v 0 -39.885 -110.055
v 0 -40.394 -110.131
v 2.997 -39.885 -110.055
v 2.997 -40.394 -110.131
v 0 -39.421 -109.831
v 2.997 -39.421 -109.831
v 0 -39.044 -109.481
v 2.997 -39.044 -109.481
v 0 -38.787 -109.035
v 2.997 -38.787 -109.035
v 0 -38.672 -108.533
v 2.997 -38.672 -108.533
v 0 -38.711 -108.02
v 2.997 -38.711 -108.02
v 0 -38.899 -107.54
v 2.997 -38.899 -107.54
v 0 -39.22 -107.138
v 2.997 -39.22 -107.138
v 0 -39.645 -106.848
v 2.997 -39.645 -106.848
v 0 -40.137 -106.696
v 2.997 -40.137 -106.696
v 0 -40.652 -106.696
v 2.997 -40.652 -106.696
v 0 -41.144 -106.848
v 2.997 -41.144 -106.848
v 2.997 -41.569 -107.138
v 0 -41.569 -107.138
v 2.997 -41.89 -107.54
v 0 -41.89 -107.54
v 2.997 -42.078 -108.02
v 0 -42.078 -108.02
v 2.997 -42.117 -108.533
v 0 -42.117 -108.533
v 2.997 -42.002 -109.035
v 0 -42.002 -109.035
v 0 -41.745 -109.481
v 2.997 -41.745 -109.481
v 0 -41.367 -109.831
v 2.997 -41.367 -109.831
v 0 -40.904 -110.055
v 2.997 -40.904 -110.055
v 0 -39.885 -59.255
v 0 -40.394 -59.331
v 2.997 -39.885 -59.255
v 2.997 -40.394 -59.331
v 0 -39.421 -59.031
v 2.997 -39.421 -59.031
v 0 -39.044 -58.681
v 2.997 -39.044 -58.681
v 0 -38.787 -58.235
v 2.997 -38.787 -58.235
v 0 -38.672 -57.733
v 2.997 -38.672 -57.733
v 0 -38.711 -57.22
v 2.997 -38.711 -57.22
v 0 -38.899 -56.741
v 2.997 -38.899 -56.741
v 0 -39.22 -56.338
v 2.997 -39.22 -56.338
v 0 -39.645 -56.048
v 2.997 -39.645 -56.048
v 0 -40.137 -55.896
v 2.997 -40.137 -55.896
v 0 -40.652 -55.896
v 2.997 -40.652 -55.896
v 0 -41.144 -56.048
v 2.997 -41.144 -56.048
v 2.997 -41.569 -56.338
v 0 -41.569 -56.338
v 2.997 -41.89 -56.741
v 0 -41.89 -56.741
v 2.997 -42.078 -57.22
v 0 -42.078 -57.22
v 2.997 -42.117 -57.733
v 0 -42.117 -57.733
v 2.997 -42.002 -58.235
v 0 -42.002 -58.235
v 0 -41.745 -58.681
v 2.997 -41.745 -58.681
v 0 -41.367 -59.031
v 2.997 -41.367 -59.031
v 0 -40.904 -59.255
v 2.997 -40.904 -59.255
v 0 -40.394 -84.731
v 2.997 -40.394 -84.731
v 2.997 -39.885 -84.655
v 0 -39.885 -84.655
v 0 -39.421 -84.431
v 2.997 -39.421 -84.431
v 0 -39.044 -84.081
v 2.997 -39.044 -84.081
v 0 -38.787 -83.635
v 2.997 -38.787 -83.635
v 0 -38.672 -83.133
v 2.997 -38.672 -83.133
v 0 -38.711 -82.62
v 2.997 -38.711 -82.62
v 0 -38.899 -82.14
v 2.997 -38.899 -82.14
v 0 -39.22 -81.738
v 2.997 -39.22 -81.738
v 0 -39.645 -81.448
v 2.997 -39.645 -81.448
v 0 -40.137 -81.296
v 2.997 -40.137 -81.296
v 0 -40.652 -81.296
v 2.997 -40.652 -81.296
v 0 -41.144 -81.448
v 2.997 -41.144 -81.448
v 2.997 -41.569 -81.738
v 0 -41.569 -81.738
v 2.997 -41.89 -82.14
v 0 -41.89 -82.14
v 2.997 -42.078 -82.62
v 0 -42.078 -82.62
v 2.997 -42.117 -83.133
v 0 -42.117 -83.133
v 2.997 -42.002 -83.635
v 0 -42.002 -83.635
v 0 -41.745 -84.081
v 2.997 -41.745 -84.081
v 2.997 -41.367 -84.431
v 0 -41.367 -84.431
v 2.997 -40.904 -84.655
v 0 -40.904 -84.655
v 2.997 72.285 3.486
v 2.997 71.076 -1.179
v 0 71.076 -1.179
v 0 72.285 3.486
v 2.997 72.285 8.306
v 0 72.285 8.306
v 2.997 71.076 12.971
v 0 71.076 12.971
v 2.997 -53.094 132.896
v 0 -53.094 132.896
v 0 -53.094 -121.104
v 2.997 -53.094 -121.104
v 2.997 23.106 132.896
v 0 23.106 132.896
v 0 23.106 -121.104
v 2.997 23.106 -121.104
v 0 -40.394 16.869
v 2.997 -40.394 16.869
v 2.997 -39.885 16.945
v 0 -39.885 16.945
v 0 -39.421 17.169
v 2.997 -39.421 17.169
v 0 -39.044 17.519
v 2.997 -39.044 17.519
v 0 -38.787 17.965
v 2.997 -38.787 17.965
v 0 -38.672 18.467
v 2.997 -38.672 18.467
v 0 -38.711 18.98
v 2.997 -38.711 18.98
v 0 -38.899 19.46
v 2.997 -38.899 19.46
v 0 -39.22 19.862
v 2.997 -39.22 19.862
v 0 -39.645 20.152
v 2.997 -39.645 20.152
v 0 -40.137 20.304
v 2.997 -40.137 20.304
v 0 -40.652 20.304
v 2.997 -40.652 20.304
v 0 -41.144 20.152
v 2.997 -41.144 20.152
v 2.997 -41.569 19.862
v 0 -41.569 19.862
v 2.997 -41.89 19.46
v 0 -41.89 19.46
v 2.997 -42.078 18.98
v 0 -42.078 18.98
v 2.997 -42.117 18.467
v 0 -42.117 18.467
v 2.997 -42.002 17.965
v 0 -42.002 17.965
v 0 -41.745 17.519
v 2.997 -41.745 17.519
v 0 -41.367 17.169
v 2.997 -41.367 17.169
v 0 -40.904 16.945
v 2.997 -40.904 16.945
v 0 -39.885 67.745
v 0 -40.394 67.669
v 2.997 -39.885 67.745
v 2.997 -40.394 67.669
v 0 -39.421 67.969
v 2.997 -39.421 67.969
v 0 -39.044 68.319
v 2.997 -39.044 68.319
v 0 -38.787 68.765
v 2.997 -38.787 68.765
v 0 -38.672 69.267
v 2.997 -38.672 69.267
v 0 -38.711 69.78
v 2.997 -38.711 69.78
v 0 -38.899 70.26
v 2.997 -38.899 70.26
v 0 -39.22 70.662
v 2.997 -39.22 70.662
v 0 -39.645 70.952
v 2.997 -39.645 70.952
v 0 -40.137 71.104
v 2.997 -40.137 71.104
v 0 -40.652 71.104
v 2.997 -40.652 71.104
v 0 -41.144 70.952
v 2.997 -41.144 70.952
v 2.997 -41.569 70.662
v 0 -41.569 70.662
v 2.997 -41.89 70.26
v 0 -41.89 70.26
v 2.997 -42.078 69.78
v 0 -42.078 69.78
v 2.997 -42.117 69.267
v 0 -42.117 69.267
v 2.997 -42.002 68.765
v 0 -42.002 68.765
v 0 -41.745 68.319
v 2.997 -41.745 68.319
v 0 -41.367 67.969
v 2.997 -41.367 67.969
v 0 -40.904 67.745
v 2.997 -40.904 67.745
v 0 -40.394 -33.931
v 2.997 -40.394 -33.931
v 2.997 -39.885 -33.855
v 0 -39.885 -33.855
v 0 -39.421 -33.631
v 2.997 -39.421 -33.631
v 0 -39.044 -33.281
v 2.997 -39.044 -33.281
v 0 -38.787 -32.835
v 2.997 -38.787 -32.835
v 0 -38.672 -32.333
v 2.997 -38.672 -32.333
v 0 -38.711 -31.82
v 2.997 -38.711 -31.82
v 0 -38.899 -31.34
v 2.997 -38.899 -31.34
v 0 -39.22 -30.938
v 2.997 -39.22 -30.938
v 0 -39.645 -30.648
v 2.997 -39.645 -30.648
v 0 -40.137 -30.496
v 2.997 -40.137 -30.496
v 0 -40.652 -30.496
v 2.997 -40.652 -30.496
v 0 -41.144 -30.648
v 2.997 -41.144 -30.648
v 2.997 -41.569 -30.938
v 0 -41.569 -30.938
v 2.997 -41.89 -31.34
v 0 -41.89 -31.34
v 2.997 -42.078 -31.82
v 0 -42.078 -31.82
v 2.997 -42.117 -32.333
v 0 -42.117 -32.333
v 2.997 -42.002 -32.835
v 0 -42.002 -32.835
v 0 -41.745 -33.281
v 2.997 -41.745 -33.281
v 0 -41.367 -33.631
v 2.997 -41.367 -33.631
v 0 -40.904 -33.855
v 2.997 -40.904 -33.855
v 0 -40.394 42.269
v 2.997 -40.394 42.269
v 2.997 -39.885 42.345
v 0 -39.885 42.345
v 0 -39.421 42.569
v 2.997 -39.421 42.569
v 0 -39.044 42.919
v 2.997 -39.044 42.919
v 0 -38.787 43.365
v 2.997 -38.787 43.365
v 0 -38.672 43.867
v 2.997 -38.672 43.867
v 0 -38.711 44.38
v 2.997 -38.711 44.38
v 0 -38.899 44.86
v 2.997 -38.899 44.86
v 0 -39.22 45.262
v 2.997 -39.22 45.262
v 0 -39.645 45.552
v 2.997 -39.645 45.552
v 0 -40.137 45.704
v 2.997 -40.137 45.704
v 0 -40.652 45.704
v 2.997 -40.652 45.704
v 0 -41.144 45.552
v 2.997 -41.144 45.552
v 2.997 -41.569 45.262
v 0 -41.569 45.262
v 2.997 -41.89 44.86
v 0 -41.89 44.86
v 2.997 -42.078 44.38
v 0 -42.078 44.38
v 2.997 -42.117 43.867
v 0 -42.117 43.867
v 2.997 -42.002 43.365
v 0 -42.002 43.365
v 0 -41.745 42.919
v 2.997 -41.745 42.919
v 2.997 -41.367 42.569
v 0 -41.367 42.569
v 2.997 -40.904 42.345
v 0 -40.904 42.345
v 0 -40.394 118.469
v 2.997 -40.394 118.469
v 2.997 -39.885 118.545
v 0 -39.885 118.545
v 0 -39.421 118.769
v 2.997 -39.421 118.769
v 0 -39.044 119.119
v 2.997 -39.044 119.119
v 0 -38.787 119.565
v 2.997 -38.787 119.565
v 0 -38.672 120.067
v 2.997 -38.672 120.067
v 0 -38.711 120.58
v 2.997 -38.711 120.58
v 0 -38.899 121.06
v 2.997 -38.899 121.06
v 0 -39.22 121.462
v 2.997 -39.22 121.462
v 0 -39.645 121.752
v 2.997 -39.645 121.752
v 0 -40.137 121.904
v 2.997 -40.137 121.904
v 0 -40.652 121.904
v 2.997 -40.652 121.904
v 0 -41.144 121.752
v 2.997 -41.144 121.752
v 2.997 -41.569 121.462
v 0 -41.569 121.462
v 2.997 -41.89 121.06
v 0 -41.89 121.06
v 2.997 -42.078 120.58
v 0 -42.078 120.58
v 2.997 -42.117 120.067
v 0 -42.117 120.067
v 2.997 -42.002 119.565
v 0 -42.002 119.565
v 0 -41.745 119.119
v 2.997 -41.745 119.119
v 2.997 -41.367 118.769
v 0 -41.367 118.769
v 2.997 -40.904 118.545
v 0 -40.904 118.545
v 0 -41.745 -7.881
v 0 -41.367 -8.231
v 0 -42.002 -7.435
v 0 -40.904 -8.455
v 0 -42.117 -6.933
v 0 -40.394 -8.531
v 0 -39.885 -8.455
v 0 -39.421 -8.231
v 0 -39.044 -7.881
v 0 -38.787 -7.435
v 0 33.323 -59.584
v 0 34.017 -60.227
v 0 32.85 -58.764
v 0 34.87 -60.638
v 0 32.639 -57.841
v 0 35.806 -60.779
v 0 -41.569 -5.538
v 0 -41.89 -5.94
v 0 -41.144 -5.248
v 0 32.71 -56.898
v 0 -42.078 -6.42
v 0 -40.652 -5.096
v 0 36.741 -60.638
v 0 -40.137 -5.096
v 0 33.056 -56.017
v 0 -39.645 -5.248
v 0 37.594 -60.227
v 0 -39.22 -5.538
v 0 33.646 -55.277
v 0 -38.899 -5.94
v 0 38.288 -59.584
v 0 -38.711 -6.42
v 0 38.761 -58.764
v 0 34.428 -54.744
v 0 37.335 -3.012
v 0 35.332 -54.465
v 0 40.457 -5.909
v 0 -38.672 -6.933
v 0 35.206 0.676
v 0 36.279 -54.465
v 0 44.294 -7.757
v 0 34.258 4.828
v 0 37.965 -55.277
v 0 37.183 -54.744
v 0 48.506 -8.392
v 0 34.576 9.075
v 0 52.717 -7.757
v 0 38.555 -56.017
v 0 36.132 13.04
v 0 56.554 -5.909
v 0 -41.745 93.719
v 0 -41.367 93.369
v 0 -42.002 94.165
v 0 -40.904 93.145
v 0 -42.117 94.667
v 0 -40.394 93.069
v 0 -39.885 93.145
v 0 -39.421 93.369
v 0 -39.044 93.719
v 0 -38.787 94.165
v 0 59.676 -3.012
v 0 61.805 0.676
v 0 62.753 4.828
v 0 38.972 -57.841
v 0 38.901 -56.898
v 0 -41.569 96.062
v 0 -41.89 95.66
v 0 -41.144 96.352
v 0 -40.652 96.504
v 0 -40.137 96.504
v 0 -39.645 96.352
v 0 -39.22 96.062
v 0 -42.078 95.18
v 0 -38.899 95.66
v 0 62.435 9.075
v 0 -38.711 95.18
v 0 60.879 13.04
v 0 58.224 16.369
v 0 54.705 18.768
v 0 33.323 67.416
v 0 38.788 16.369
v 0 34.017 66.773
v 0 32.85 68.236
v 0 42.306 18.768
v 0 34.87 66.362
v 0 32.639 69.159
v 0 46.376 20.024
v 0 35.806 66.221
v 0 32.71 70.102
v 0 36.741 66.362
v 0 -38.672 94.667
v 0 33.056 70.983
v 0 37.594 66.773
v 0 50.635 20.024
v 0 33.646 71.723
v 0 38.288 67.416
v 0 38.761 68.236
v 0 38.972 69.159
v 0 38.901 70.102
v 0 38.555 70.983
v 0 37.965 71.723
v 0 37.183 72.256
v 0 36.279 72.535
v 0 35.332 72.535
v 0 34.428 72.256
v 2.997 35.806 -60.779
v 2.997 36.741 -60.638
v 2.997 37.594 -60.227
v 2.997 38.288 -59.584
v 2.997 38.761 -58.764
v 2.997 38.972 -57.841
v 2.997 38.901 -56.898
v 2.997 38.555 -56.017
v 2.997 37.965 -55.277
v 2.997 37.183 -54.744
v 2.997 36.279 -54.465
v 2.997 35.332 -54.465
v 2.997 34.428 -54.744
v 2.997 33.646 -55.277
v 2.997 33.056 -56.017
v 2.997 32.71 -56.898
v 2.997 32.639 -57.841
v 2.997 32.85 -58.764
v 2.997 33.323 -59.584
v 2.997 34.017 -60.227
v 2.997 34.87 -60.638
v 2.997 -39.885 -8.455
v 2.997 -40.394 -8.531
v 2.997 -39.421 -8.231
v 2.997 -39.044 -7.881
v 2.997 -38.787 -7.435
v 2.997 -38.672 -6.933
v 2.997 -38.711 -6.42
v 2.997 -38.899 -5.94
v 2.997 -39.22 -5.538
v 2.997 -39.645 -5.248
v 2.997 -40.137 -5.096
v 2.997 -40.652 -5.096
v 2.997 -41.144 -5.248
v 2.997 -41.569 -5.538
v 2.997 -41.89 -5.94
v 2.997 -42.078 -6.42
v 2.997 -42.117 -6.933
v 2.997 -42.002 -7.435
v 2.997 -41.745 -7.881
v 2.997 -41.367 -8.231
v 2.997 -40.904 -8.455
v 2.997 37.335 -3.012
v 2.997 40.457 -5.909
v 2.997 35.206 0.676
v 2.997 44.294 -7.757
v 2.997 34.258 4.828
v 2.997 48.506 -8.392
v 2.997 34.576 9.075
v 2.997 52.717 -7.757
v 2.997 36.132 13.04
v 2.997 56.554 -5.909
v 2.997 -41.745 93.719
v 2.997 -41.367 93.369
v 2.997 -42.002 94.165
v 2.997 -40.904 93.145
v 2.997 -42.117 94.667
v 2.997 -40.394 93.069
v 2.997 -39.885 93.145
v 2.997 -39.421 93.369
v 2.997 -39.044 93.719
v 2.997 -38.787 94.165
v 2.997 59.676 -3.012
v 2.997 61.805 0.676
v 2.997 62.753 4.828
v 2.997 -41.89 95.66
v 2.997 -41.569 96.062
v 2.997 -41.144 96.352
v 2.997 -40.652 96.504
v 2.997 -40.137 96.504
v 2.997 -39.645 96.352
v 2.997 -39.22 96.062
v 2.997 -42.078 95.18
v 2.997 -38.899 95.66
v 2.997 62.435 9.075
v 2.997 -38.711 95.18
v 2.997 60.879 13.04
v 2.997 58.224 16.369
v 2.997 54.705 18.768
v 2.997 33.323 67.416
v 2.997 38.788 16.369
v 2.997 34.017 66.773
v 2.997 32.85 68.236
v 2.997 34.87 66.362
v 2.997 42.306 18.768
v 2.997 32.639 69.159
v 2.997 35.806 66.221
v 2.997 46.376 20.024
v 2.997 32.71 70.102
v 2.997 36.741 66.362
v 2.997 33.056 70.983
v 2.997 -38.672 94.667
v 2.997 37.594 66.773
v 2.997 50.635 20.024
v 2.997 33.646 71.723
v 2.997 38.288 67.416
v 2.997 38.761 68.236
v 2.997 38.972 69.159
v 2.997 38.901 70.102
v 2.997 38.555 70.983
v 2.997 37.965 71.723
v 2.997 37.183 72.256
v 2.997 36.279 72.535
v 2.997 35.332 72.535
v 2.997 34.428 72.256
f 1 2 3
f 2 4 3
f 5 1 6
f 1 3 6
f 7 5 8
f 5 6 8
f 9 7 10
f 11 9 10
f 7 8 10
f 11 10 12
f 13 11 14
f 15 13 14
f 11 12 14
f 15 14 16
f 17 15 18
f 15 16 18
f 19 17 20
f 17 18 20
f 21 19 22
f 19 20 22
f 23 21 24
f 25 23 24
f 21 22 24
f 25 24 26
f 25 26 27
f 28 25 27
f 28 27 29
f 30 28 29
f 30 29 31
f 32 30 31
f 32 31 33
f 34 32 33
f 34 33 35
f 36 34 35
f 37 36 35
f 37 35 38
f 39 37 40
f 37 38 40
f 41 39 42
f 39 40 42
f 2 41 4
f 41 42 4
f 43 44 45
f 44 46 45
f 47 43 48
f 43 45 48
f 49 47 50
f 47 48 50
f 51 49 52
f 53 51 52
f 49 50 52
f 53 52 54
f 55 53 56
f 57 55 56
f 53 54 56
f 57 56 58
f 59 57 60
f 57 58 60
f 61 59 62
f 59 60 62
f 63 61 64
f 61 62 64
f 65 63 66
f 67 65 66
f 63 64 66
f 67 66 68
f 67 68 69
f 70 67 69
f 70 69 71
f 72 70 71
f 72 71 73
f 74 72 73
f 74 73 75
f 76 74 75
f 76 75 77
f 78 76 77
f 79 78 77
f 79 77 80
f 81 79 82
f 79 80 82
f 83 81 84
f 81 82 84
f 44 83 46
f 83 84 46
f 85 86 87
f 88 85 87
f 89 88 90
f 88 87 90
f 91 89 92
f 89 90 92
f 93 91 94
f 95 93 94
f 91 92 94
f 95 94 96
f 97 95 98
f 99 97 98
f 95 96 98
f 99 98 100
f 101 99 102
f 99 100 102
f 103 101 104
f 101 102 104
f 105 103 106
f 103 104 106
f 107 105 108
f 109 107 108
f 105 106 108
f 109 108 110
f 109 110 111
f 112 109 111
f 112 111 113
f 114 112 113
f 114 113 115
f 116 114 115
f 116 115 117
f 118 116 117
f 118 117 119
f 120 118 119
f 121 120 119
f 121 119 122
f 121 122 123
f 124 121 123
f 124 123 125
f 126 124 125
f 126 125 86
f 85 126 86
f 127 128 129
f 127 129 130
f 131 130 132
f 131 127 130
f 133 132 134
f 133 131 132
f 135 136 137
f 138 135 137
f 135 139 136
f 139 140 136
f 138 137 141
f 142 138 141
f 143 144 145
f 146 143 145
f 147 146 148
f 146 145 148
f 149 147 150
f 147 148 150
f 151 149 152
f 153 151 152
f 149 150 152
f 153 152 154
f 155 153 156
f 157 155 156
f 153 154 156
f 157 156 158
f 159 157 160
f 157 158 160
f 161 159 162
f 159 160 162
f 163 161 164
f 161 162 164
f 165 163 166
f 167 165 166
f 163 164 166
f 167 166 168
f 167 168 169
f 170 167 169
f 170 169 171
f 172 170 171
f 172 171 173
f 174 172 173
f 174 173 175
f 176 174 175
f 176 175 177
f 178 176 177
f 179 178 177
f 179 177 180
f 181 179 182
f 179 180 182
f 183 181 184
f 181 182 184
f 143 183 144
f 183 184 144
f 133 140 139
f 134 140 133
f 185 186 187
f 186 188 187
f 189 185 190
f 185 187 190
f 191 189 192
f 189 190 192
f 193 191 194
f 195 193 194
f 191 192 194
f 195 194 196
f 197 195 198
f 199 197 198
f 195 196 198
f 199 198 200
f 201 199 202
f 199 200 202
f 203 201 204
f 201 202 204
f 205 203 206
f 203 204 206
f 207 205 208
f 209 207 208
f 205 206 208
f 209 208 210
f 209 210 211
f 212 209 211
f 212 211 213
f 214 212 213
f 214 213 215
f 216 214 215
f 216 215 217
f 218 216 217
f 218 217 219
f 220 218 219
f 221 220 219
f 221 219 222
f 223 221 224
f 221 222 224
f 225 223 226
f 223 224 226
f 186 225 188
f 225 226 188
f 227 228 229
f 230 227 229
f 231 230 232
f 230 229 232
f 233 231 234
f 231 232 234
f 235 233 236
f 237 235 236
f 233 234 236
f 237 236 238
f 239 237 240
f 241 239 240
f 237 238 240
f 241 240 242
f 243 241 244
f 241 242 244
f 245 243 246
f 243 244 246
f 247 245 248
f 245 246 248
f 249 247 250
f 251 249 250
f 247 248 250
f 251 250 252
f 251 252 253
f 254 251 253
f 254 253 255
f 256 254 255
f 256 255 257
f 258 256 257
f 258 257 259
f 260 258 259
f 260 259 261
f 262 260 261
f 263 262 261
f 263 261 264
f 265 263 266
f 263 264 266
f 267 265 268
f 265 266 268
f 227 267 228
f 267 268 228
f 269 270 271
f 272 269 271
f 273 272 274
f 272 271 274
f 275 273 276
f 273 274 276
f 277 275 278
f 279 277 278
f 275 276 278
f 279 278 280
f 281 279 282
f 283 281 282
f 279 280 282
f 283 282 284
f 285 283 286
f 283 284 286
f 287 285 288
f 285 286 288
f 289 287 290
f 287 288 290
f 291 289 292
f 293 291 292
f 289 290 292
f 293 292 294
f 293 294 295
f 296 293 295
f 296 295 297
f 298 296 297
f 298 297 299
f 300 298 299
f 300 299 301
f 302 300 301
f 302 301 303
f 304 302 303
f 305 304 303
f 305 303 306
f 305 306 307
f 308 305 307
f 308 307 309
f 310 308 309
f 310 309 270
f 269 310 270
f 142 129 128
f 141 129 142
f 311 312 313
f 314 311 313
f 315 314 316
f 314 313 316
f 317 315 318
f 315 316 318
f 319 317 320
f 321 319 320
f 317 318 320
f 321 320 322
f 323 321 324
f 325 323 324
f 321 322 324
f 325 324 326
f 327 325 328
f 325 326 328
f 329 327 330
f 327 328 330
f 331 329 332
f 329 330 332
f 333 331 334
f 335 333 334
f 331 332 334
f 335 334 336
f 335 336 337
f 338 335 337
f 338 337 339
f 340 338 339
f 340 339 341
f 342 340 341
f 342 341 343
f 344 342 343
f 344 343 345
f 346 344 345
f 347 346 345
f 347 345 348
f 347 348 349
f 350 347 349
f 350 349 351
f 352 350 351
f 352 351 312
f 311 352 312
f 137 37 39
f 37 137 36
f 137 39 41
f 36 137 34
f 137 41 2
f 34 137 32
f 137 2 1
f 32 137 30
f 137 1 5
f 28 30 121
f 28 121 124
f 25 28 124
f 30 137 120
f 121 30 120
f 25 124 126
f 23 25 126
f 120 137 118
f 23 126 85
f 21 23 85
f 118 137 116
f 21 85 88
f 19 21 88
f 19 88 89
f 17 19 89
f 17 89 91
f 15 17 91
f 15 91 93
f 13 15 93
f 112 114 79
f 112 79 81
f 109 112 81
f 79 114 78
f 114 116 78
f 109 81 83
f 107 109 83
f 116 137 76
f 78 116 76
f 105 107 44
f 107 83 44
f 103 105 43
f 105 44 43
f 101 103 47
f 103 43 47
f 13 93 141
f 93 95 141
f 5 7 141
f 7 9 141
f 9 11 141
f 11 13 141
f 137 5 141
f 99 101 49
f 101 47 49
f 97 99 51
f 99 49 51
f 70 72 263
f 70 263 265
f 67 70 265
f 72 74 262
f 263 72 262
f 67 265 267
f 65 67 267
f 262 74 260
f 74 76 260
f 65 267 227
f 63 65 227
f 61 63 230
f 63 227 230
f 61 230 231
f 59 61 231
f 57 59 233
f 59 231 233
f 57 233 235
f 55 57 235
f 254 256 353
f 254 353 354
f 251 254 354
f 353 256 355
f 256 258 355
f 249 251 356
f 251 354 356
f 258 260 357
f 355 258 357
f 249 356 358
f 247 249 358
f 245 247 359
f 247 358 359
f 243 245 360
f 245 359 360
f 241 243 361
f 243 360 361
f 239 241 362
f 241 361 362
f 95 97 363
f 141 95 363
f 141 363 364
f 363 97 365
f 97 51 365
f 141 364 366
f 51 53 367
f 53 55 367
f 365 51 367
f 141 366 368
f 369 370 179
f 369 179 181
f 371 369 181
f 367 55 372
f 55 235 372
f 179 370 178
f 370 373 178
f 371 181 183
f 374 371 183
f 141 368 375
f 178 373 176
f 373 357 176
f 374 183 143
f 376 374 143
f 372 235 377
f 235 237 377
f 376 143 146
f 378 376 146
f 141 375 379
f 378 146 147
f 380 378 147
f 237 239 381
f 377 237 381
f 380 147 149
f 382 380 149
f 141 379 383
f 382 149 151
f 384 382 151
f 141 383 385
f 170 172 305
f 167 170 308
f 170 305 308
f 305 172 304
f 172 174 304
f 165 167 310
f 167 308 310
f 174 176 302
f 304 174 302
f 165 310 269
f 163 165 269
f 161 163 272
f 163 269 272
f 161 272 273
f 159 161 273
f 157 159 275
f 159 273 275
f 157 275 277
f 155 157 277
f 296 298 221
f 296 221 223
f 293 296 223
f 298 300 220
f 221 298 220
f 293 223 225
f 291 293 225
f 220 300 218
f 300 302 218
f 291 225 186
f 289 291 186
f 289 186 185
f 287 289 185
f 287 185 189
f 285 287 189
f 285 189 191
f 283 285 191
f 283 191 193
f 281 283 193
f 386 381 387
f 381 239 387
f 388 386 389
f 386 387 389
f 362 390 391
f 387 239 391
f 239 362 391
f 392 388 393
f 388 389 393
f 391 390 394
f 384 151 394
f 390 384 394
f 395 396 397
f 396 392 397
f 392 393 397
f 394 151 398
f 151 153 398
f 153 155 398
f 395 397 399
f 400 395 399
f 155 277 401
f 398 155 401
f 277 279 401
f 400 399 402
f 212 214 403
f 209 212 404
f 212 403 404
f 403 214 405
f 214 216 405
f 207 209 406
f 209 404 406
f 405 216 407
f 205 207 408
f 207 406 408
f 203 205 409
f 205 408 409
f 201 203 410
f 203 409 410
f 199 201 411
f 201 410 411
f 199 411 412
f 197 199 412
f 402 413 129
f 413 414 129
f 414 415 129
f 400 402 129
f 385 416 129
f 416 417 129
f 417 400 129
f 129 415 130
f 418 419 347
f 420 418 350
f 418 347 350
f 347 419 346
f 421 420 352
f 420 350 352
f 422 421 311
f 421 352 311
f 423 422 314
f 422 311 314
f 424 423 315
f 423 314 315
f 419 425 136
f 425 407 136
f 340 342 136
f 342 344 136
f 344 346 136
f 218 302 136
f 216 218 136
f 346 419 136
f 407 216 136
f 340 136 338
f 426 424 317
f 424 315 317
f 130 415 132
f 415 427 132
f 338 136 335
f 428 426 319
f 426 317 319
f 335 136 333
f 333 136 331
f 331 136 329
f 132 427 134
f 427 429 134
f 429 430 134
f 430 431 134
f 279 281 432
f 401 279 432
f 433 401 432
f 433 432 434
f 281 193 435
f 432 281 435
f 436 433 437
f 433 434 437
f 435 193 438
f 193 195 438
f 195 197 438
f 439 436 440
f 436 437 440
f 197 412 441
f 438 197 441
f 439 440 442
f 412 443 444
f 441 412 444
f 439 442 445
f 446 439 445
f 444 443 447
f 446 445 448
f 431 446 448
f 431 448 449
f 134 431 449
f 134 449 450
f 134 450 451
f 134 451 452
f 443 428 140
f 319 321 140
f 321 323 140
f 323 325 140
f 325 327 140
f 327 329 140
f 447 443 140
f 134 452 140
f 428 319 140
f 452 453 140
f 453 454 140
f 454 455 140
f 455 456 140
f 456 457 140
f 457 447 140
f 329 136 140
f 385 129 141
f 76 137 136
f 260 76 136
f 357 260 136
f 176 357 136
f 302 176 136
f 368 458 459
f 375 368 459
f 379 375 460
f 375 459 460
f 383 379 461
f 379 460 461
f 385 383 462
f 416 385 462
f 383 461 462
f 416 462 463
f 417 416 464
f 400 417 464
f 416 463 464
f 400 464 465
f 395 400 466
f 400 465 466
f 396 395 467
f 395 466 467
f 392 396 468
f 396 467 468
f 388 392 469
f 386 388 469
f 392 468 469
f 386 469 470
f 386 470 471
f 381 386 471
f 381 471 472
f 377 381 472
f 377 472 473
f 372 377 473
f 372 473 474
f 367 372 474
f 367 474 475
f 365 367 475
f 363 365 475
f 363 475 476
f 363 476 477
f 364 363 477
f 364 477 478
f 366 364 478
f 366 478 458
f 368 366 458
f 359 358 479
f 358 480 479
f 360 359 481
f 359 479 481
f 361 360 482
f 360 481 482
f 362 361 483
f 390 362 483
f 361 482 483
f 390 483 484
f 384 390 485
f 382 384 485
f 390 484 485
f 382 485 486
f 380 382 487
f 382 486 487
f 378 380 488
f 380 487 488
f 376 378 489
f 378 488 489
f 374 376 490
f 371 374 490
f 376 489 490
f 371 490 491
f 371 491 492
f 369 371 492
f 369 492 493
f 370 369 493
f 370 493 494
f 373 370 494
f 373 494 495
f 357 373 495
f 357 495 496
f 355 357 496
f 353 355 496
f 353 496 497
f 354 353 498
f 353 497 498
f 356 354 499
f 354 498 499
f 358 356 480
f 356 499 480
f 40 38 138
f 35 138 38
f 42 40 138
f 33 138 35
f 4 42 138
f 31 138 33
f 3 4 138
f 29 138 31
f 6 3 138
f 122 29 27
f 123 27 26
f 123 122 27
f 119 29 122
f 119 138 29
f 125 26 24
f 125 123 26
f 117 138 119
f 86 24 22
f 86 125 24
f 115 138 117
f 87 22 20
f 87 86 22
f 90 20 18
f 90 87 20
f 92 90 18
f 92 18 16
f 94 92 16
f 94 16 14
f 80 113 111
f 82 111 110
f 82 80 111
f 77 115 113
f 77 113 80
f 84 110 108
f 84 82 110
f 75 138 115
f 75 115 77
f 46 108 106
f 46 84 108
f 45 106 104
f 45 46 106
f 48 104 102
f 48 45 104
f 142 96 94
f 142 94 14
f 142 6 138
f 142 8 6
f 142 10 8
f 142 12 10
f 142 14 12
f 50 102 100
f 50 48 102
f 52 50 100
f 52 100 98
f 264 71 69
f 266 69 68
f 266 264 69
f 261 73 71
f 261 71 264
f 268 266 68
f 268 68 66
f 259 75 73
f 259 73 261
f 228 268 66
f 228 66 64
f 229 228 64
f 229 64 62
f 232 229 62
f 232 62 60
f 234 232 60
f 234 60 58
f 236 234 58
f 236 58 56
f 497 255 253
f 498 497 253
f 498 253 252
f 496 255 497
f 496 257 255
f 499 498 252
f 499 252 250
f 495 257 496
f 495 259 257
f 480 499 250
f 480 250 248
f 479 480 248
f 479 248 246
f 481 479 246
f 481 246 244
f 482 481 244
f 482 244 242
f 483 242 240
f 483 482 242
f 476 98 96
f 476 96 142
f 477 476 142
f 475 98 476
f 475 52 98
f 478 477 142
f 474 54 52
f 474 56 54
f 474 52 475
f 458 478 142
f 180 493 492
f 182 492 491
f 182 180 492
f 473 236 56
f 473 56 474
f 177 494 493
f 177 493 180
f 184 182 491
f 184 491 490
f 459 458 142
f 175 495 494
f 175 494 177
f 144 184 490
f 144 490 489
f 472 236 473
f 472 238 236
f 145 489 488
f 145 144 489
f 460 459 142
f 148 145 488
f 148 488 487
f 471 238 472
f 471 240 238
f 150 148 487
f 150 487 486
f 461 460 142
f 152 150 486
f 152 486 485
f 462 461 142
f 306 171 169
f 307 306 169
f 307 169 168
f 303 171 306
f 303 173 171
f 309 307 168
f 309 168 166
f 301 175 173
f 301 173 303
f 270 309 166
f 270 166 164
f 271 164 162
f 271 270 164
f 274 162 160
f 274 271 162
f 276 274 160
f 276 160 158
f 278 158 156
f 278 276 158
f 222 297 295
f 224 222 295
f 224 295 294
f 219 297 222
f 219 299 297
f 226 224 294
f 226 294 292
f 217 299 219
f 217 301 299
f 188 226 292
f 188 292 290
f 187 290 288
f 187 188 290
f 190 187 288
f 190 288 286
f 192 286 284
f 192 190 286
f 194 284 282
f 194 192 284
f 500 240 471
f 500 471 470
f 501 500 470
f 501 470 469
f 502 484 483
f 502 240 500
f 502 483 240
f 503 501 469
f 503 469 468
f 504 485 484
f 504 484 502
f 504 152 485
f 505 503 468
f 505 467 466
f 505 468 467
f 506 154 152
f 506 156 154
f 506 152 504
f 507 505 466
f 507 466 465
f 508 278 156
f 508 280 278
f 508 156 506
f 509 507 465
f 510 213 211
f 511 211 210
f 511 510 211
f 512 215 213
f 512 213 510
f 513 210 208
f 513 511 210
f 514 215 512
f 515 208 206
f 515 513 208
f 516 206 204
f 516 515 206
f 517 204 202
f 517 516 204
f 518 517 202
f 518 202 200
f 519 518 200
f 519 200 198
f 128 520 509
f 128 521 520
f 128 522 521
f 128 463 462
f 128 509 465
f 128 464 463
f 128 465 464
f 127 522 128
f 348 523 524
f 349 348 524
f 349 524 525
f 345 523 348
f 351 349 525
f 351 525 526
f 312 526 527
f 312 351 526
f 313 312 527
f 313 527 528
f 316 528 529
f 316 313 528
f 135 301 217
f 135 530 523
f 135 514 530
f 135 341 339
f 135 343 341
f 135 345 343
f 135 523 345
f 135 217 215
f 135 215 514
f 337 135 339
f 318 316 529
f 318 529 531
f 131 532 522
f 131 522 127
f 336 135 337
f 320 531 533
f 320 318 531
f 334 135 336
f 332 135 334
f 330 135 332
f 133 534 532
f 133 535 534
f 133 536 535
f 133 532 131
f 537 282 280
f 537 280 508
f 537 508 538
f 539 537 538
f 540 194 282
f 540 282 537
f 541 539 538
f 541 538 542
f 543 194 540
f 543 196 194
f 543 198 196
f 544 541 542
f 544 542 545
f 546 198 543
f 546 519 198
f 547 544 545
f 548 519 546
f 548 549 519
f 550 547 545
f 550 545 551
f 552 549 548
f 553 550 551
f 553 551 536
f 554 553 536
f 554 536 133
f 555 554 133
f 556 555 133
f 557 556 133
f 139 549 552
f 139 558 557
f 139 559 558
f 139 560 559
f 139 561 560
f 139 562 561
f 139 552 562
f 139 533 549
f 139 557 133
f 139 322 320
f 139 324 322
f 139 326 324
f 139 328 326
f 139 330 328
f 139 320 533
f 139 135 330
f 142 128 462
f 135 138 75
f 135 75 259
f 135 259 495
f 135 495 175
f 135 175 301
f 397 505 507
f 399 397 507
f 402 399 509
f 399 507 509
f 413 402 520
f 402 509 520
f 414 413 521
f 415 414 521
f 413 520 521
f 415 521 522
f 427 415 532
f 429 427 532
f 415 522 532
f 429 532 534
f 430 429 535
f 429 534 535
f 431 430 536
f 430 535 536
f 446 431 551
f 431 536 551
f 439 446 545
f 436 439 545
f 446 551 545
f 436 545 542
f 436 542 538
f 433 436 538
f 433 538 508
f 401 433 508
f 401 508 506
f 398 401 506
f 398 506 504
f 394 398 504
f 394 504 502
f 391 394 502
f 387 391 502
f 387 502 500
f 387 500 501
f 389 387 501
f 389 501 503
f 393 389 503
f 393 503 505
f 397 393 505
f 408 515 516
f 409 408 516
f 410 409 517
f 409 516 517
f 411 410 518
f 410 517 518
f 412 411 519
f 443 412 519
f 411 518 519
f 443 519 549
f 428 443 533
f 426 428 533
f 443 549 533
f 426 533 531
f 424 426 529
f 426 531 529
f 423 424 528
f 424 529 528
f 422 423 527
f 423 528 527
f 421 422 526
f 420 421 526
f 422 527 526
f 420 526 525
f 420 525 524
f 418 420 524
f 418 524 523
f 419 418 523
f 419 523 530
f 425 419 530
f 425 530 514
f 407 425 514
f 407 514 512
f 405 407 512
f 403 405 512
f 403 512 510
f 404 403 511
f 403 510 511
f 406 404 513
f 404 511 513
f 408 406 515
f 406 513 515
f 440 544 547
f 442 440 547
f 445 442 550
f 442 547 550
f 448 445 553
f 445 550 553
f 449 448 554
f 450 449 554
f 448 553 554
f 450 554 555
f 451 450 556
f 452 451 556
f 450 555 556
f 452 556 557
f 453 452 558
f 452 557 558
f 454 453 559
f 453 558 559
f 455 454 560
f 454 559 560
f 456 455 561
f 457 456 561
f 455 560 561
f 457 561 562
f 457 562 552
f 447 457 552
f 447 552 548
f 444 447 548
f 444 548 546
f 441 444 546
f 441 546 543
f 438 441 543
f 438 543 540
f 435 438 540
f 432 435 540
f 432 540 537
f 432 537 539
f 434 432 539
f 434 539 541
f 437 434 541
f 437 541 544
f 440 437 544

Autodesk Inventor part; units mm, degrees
ref_plane "YZ Plane" through (0, 0, 0) normal (1, 0, 0) x (0, 1, 0)
ref_plane "XZ Plane" through (0, 0, 0) normal (0, 1, 0) x (-1, 0, 0)
ref_plane "XY Plane" through (0, 0, 0) normal (0, 0, 1) x (1, 0, 0)
sketch "Sketch1" plane through (0, 0, 0) normal (1, 0, 0) x (0, 1, 0)
  line L0 (23.1056, 132.8959) -> (-53.0944, 132.8959)
  line L1 (-53.0944, 132.8959) -> (-53.0944, -121.1041)
  line L2 (-53.0944, -121.1041) -> (23.1056, -121.1041)
  line L3 (23.1056, 132.8959) -> (73.9056, 5.8959)
  line L4 (73.9056, 5.8959) -> (23.1056, -121.1041)
  line L5 (73.9056, 5.8959) -> (-53.0944, 5.8959) construction
  point P0 (0, 0)
  dimension "d0" = 76.2
  dimension "d1" = 254
extrude "Extrusion1" add sketch "Sketch1" along normal blind 2.9972
sketch "Sketch2" plane through (2.9972, 0, 0) normal (1, 0, 0) x (0, 0, -1)
  circle A0 centre (-120.1959, -40.3944) radius 1.7272
  line L0 (-132.8959, 23.1056) -> (-132.8959, -53.0944) projected
  line L1 (-132.8959, -53.0944) -> (121.1041, -53.0944) projected
  point P0 (0, 0)
  dimension "d5" = 12.7
  dimension "d6" = 12.7
  dimension "d7" = 3.4544
extrude "Extrusion2" cut sketch "Sketch2" against normal through all
pattern_linear "Rectangular Pattern1" count 10 spacing 25.4 along (0, 0, -1) of "Extrusion2"
sketch "Sketch3" plane through (2.9972, 0, 0) normal (1, 0, 0) x (0, 0, -1)
  circle A0 centre (-5.8959, 48.5056) radius 14.2875
  line L0 (121.1041, 23.1056) -> (-5.8959, 73.9056) projected
  line L1 (-5.8959, 73.9056) -> (-5.8959, 48.5056) construction
  point P0 (0, 0)
  dimension "d13" = 28.575
  dimension "d14" = 25.4
extrude "Extrusion3" cut sketch "Sketch3" against normal through all
sketch "Sketch4" plane through (2.9972, 0, 0) normal (1, 0, 0) x (0, 0, -1)
  circle A0 centre (-69.3959, 35.8056) radius 3.175
  circle A1 centre (57.6041, 35.8056) radius 3.175
  line L0 (-69.3959, 35.8056) -> (57.6041, 35.8056) construction
  line L1 (121.1041, 23.1056) -> (-5.8959, 73.9056) projected
  line L2 (-5.8959, 73.9056) -> (-5.8959, 17.32) construction
  point P0 (0, 0)
  dimension "d17" = 6.35
  dimension "d18" = 127
  dimension "d19" = 63.5
  dimension "d20" = 38.1
extrude "Extrusion4" cut sketch "Sketch4" against normal through all
fillet "Fillet1" radius 19.05 1 edges at (1.4986, 73.9056, 5.8959)
properties part number "Jeep Plate" material "Polycarbonate, Clear"
